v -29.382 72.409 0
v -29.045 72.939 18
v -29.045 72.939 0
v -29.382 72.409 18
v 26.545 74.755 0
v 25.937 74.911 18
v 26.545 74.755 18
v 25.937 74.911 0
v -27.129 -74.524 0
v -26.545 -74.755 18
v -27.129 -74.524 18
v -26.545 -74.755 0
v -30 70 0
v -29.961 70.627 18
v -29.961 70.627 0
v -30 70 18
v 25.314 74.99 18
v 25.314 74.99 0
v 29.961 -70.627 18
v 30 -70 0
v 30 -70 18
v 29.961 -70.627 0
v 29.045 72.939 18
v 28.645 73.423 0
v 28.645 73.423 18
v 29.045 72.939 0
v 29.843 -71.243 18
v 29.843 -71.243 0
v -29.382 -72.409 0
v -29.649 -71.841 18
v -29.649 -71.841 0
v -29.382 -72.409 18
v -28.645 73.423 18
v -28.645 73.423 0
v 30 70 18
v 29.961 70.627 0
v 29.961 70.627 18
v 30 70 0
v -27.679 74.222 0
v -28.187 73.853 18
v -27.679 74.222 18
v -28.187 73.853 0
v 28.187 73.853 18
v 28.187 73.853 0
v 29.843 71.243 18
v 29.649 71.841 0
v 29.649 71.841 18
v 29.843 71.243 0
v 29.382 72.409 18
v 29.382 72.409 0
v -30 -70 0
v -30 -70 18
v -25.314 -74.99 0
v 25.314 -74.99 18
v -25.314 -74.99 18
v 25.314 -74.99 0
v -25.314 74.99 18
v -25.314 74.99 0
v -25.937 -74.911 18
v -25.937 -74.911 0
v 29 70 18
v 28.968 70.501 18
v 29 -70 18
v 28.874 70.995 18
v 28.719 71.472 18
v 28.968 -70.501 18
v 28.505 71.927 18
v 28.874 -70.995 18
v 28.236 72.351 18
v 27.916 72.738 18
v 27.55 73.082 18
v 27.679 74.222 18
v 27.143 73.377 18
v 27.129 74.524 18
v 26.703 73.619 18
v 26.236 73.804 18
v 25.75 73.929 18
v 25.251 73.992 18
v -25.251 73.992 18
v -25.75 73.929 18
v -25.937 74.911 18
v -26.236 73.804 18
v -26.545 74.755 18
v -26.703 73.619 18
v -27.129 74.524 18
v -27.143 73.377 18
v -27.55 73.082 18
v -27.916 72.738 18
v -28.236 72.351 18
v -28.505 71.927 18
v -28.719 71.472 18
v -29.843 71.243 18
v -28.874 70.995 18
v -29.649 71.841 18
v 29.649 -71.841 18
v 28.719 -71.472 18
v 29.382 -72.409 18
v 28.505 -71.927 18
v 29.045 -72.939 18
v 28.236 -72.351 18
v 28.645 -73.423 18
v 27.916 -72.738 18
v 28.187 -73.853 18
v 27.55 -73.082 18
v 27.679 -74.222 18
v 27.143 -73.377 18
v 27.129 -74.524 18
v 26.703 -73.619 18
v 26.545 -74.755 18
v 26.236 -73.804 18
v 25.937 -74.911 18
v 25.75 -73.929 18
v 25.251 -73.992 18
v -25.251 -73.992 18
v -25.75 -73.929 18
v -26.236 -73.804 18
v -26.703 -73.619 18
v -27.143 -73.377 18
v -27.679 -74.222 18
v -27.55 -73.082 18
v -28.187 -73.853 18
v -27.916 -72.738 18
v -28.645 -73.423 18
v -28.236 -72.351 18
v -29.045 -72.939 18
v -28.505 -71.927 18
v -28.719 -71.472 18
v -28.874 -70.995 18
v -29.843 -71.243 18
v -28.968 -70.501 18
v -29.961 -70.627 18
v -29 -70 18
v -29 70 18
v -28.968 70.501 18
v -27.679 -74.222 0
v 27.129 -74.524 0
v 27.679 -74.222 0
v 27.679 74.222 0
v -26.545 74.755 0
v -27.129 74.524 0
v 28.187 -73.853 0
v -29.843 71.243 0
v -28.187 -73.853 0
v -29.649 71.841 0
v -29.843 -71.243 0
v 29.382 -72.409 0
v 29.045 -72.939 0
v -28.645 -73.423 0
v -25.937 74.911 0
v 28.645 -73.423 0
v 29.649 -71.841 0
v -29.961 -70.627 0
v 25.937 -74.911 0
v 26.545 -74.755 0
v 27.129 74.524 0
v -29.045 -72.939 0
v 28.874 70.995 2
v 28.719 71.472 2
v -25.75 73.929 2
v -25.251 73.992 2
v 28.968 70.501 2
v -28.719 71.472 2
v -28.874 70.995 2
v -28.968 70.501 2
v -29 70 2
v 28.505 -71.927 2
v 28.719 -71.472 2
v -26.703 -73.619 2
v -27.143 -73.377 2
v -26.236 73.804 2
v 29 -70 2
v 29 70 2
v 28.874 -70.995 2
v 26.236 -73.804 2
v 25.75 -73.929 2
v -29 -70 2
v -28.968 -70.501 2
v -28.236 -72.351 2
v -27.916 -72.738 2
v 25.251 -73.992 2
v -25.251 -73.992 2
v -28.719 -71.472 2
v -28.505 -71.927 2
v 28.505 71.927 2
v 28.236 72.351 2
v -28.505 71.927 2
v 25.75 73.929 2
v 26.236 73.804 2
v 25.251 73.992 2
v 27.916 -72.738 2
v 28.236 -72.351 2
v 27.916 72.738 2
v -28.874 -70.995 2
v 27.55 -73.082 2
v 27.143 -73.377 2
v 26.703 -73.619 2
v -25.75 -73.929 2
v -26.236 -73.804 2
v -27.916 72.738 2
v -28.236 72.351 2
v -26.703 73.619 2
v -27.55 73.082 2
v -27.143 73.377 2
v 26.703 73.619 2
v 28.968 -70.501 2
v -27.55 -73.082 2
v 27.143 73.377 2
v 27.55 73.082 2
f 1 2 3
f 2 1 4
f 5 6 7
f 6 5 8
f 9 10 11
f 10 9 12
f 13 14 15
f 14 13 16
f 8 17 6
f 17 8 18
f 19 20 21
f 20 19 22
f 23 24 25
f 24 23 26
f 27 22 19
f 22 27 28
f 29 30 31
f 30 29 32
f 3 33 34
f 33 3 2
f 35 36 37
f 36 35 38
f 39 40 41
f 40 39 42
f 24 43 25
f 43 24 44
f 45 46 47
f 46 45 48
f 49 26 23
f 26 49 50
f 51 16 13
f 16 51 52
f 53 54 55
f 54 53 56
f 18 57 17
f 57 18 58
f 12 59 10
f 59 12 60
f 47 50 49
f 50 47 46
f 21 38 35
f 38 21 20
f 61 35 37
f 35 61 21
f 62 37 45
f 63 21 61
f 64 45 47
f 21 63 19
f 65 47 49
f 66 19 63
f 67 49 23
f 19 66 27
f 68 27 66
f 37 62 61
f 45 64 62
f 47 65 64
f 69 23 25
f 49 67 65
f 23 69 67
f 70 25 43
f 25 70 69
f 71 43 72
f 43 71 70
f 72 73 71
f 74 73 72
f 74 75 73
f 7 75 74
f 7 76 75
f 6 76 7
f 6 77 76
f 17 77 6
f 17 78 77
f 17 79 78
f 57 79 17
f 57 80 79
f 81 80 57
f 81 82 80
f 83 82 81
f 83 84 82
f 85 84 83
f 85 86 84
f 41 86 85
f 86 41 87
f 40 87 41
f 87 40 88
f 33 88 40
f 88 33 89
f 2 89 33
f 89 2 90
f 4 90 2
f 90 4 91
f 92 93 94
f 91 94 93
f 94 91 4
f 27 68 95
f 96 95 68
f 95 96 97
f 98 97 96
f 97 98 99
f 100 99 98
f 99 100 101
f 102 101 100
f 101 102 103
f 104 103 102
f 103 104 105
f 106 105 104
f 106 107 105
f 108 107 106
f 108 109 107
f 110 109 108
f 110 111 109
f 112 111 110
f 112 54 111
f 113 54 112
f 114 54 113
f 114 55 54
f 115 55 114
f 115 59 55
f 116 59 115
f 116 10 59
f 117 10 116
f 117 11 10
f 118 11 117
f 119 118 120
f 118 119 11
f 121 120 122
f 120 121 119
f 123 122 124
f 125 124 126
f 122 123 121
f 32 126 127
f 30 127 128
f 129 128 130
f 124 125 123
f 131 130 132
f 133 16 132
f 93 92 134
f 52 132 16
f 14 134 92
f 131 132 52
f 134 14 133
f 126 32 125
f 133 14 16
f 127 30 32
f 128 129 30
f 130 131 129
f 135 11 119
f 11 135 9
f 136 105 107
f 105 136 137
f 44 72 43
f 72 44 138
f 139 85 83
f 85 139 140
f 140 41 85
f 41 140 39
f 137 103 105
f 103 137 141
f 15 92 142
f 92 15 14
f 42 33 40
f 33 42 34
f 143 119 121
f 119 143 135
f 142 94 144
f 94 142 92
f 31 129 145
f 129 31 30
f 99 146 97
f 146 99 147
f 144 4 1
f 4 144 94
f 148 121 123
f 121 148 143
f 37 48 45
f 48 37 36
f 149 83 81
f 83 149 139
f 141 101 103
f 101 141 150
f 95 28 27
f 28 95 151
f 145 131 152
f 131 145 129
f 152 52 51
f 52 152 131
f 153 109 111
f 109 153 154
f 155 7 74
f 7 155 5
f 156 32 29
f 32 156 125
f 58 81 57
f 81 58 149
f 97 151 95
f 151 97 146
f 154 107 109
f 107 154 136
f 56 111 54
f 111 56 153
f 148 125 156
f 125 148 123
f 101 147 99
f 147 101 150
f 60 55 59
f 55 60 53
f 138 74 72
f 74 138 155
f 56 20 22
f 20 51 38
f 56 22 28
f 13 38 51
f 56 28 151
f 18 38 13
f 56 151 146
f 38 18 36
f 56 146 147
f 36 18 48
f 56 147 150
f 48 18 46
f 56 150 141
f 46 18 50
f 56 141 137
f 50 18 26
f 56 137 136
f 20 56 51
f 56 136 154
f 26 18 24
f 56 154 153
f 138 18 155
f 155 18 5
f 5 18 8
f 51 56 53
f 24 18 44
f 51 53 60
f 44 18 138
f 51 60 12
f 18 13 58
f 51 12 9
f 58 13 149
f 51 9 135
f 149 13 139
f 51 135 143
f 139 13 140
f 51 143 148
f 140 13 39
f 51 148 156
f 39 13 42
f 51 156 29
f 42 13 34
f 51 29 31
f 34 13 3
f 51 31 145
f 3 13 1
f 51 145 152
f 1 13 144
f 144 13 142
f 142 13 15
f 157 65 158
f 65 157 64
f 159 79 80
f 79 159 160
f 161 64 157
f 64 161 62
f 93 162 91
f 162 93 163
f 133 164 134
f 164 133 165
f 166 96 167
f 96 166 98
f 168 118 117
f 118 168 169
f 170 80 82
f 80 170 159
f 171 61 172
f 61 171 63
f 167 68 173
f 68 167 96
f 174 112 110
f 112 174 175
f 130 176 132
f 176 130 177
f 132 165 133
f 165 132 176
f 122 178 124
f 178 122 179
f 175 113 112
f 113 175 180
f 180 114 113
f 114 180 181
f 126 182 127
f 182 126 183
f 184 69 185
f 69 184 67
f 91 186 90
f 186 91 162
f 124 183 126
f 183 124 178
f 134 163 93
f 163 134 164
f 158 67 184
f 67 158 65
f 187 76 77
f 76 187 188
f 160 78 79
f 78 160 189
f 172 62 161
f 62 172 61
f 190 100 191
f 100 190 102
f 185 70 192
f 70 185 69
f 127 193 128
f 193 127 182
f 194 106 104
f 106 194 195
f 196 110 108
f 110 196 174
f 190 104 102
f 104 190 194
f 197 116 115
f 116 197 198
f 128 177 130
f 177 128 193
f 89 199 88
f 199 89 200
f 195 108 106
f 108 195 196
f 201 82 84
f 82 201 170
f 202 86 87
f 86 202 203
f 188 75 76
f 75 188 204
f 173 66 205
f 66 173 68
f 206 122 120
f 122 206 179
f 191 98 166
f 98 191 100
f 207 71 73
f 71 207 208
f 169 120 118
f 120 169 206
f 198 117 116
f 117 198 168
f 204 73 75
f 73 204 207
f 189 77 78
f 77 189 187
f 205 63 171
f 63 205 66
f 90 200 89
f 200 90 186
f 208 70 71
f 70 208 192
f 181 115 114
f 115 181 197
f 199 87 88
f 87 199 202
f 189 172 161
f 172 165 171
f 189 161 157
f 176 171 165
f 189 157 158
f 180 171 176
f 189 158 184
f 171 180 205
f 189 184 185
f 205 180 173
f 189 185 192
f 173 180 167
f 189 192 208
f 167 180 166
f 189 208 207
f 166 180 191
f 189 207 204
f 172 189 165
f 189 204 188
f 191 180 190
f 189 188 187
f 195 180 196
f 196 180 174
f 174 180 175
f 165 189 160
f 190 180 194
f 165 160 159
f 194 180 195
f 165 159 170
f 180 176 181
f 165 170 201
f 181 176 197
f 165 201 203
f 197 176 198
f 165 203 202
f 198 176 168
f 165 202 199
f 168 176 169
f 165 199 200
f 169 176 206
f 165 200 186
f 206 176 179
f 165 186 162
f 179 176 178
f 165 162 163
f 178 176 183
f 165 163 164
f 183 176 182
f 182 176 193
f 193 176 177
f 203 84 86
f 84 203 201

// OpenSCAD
$fn = 50;


difference() {
	union() {
		hull() {
			translate(v = [-25.0000000000, 70.0000000000, 0]) {
				cylinder(h = 18, r = 5);
			}
			translate(v = [25.0000000000, 70.0000000000, 0]) {
				cylinder(h = 18, r = 5);
			}
			translate(v = [-25.0000000000, -70.0000000000, 0]) {
				cylinder(h = 18, r = 5);
			}
			translate(v = [25.0000000000, -70.0000000000, 0]) {
				cylinder(h = 18, r = 5);
			}
		}
	}
	union() {
		translate(v = [0, 0, 2]) {
			hull() {
				translate(v = [-25.0000000000, 70.0000000000, 0]) {
					cylinder(h = 16, r = 4);
				}
				translate(v = [25.0000000000, 70.0000000000, 0]) {
					cylinder(h = 16, r = 4);
				}
				translate(v = [-25.0000000000, -70.0000000000, 0]) {
					cylinder(h = 16, r = 4);
				}
				translate(v = [25.0000000000, -70.0000000000, 0]) {
					cylinder(h = 16, r = 4);
				}
			}
		}
	}
}
